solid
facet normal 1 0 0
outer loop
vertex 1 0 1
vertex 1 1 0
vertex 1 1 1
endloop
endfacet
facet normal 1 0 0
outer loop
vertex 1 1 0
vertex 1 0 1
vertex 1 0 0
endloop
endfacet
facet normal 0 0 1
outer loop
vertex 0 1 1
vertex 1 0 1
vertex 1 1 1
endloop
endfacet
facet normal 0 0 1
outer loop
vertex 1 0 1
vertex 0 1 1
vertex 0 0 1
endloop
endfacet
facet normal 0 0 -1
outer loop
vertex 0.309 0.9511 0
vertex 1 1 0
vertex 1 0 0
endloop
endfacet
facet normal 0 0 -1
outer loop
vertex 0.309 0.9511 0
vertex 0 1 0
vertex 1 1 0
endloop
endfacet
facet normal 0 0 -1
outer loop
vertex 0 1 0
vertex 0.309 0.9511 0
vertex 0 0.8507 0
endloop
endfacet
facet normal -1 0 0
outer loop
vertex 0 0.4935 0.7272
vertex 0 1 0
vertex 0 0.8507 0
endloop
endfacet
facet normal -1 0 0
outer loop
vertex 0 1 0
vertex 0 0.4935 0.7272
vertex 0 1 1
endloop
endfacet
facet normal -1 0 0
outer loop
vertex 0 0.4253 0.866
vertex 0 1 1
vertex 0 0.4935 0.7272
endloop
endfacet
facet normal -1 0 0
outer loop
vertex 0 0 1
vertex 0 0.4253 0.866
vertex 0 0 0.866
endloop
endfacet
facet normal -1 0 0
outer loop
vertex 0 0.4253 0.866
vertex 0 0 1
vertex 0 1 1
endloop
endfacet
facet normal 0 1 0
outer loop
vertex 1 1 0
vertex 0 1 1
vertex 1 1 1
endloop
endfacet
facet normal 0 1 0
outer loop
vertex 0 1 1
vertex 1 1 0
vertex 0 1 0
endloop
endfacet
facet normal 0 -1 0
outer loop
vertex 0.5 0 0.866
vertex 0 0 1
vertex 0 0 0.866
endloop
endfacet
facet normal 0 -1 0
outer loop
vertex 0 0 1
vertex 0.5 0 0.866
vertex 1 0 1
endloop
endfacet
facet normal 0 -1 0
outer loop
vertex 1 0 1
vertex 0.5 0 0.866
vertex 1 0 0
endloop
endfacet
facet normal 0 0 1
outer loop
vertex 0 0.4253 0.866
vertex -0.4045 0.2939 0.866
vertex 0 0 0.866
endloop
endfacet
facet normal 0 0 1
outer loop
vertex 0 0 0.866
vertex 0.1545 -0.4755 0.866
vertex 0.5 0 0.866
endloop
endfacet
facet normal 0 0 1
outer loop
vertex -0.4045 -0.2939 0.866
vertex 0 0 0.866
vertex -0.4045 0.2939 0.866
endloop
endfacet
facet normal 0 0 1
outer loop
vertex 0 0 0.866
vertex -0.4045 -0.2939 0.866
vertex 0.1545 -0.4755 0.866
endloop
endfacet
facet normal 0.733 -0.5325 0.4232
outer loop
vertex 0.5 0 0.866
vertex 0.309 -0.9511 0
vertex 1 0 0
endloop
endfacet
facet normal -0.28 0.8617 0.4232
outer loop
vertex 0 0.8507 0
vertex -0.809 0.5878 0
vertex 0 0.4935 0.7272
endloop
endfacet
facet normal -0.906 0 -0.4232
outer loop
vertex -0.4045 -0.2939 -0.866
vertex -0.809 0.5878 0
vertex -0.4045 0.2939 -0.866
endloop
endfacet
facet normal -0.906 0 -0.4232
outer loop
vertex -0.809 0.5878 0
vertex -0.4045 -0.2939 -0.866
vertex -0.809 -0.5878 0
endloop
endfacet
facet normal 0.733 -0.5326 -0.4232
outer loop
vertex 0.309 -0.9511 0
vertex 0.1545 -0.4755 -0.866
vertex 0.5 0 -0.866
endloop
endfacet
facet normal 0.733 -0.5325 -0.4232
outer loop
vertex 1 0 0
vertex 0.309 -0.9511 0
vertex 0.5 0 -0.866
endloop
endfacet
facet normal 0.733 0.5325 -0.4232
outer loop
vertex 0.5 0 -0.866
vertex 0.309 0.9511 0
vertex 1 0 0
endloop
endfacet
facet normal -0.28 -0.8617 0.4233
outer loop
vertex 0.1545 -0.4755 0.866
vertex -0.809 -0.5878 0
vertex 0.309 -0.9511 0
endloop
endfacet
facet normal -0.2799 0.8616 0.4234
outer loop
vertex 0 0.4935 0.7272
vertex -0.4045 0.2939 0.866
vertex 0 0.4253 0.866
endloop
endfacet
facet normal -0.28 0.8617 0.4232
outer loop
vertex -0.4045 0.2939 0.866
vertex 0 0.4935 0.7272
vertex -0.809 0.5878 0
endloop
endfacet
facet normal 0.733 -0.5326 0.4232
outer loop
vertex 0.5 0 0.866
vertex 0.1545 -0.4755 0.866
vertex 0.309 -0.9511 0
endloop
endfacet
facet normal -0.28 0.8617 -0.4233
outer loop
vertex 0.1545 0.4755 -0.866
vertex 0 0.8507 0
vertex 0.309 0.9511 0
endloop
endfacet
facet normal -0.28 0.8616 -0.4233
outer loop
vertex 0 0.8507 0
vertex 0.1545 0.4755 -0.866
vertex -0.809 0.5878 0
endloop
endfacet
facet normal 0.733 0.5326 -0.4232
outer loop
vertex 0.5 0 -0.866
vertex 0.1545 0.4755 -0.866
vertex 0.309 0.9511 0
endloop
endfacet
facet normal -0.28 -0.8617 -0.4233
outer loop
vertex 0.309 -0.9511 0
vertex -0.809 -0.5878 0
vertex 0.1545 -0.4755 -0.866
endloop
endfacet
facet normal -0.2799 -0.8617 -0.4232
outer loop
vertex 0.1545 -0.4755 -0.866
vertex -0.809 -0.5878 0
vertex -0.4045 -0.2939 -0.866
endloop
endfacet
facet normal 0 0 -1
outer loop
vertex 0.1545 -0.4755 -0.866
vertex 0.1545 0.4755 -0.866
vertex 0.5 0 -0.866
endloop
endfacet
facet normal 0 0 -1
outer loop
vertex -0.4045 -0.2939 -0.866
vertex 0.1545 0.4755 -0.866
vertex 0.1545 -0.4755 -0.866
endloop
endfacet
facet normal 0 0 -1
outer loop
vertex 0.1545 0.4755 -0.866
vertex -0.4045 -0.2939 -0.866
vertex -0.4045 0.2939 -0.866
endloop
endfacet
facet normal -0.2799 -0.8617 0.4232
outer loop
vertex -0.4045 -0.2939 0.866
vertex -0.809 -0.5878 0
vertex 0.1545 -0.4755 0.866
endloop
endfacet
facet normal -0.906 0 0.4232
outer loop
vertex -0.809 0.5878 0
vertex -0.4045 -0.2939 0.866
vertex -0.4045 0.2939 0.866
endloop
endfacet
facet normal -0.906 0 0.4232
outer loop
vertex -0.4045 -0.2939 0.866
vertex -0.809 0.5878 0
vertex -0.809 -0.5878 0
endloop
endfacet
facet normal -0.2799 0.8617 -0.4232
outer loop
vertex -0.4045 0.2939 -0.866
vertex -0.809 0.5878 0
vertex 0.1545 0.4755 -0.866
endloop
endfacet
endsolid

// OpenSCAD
module c() children();
c() { cube(); sphere(); }
module c0() children(0);
c0() { cube(); sphere(); }
module c1() children([0, 1]);
c1() { cube(); sphere(); cylinder(); }
module cr() children([0:1]);
cr() { cube(); sphere(); cylinder(); }
